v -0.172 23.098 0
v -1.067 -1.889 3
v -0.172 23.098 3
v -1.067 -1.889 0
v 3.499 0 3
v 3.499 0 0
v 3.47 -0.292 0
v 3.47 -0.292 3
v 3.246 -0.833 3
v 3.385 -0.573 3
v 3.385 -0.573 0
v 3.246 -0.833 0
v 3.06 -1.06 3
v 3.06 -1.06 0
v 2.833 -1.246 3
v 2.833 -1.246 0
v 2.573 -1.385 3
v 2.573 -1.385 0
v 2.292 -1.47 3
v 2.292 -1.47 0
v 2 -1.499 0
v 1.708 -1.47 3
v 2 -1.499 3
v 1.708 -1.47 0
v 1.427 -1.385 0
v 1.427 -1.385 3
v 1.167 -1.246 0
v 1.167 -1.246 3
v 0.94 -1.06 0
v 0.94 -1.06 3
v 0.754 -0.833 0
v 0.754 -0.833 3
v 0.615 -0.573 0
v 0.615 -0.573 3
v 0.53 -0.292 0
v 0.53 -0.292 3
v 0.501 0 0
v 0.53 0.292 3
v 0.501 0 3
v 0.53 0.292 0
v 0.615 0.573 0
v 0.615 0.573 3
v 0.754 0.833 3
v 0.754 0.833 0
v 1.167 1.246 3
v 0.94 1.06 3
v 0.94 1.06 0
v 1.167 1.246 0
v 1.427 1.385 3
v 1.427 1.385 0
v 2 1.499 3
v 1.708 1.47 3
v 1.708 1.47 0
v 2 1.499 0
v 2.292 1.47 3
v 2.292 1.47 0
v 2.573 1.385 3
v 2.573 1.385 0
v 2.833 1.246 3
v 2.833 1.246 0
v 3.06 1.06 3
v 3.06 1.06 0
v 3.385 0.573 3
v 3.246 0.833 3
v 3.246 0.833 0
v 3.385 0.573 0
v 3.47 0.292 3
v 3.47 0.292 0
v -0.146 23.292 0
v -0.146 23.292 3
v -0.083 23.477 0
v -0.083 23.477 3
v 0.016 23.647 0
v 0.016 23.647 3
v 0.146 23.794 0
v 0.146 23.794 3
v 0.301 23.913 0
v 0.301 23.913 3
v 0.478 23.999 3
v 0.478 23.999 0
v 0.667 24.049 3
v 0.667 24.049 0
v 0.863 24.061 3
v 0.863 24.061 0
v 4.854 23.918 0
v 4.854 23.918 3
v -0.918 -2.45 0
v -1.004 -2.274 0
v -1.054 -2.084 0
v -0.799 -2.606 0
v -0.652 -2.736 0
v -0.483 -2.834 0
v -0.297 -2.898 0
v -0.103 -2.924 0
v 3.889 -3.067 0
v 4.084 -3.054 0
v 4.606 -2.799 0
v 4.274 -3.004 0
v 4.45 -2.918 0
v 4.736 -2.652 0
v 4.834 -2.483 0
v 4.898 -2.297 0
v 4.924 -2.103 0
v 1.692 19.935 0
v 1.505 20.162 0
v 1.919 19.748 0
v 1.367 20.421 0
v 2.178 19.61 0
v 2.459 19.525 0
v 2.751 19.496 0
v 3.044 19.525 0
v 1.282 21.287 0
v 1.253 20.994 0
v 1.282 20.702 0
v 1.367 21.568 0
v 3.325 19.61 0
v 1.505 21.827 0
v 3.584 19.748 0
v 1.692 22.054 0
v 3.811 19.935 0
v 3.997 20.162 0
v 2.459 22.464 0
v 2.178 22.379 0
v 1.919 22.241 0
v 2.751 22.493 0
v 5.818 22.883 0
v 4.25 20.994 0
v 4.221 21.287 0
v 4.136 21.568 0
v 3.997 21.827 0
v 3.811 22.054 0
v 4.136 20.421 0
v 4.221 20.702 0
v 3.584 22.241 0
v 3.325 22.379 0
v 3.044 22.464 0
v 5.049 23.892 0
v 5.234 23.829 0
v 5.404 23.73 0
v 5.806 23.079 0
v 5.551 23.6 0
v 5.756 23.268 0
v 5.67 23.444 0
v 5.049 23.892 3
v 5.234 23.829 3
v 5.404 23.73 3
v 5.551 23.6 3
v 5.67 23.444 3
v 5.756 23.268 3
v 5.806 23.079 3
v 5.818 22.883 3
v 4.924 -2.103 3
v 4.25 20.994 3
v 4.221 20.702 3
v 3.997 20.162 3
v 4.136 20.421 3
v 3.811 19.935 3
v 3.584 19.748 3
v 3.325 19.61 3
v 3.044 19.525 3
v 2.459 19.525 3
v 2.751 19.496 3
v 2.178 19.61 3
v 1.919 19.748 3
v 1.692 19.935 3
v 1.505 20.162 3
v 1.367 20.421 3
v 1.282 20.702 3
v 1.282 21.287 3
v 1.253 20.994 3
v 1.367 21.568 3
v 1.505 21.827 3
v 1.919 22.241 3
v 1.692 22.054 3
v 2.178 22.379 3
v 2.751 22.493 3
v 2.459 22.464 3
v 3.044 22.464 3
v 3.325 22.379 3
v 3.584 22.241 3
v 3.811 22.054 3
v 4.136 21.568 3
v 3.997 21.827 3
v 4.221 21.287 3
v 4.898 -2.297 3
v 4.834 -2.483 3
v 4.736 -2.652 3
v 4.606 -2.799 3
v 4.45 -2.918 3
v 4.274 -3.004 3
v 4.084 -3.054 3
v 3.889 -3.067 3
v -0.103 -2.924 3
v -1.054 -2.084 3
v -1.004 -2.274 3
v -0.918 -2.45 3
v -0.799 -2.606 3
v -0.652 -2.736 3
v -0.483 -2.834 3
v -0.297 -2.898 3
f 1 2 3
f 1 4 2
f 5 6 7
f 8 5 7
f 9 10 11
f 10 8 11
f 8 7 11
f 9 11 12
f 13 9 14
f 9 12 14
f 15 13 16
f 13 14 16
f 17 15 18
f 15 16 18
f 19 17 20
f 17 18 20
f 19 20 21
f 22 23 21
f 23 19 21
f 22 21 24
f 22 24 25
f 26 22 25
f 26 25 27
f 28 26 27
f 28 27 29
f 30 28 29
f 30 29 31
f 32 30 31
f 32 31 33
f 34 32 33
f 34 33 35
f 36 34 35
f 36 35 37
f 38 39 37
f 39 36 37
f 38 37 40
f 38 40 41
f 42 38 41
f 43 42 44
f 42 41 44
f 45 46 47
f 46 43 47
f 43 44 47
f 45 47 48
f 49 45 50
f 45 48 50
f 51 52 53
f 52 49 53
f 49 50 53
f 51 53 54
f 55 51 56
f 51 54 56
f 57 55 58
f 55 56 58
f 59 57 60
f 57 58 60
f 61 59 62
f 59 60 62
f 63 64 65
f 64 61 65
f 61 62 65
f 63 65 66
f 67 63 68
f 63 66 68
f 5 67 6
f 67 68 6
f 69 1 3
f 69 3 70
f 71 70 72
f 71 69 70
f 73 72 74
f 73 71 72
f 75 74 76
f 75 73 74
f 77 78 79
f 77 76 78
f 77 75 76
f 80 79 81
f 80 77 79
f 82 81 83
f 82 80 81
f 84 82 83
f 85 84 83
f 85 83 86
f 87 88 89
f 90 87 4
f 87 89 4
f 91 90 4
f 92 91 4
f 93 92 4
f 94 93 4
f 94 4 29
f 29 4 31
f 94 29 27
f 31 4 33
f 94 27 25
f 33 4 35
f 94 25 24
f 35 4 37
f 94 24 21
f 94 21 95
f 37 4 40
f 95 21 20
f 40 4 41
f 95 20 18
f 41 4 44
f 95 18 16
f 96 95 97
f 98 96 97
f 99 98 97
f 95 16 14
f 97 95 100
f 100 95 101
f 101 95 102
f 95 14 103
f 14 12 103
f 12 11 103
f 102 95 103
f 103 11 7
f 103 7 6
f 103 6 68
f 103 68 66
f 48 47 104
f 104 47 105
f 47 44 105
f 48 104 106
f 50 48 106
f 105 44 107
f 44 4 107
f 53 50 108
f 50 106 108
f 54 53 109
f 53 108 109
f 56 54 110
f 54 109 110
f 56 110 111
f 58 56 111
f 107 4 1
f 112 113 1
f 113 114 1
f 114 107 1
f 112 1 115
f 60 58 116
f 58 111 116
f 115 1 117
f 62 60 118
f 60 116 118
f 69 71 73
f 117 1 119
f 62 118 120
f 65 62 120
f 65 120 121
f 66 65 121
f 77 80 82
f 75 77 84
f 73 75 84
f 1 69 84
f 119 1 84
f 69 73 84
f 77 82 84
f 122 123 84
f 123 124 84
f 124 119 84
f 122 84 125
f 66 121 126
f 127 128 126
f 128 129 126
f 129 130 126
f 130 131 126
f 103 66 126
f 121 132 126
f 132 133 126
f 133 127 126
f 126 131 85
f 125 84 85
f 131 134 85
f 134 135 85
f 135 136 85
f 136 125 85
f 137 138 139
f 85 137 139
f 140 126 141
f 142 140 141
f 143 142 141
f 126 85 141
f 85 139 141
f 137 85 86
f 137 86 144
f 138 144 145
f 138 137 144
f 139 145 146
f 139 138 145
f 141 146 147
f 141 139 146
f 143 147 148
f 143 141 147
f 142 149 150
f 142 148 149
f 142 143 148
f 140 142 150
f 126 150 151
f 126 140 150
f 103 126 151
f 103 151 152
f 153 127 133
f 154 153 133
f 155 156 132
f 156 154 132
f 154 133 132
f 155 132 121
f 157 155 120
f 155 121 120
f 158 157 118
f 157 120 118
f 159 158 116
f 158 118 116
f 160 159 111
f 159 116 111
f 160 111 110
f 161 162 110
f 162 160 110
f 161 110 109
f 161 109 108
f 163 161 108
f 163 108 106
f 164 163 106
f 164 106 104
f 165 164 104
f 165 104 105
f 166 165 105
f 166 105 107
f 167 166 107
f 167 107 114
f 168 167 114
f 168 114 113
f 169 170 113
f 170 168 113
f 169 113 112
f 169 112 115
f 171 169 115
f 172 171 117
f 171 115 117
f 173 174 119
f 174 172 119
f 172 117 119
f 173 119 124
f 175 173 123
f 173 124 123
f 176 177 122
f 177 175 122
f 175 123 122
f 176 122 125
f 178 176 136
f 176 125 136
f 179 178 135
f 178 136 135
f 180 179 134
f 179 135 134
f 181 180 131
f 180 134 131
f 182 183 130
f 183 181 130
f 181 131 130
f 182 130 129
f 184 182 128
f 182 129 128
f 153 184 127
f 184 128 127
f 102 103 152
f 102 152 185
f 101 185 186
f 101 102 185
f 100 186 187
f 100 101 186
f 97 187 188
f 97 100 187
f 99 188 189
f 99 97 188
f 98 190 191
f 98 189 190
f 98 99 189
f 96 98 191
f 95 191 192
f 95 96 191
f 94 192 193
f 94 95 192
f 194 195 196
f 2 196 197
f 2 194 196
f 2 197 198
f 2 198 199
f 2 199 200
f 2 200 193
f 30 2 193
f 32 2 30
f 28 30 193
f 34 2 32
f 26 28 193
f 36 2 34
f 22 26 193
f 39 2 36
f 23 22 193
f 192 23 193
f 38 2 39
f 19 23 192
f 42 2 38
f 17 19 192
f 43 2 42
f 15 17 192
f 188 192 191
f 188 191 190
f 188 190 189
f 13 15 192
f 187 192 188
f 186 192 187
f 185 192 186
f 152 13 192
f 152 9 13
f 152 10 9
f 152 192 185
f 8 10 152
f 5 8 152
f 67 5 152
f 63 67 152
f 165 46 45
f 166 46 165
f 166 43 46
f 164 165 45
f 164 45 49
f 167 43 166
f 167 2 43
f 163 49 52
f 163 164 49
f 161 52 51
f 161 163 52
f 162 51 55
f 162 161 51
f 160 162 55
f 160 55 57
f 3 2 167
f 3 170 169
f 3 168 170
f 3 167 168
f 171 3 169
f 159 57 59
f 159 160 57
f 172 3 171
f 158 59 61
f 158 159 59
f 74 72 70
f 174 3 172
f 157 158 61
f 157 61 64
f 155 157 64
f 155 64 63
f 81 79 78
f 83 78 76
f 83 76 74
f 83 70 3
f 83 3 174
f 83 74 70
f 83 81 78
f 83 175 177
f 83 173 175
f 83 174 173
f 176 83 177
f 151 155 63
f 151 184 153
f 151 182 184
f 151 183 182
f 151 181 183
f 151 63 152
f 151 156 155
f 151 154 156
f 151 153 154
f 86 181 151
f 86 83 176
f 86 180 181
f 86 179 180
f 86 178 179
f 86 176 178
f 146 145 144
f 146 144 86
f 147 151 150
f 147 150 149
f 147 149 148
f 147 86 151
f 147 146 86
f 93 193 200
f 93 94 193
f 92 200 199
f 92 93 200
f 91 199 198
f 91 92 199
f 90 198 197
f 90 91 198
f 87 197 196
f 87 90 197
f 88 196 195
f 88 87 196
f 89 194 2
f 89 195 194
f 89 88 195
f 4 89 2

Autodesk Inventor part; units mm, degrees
ref_plane "YZ Plane" through (0, 0, 0) normal (1, 0, 0) x (0, 1, 0)
ref_plane "XZ Plane" through (0, 0, 0) normal (0, 1, 0) x (-1, 0, 0)
ref_plane "XY Plane" through (0, 0, 0) normal (0, 0, 1) x (1, 0, 0)
sketch "Sketch1" plane through (0, 0, 0) normal (0, 0, 1) x (1, 0, 0)
  line L0 (-1.0667, -1.8887) -> (-0.1724, 23.0976)
  line L1 (0.8627, 24.0612) -> (4.8545, 23.9183)
  line L2 (5.8181, 22.8832) -> (4.9238, -2.1031)
  line L3 (3.8887, -3.0667) -> (-0.1031, -2.9238)
  circle A0 centre (2, 0) radius 1.4986
  circle A1 centre (2.7514, 20.9945) radius 1.4986
  circle A2 centre (2.7514, 20.9945) radius 1.4986 projected
  circle A3 centre (2, 0) radius 1.4986 projected
  arc A4 (-1.0667, -1.8887) -> (-0.1031, -2.9238) centre (-0.0674, -1.9245) ccw
  arc A5 (3.8887, -3.0667) -> (4.9238, -2.1031) centre (3.9245, -2.0674) ccw
  arc A6 (5.8181, 22.8832) -> (4.8545, 23.9183) centre (4.8188, 22.919) ccw
  arc A7 (0.8627, 24.0612) -> (-0.1724, 23.0976) centre (0.8269, 23.0619) ccw
  point P0 (0, 0)
  dimension "d0" = 5.9944
  dimension "d1" = 2.9972
  dimension "d2" = 2.9972
  dimension "d3" = 2.9972
  dimension "d4" = 2.9972
  dimension "d6" = 2.9972
  dimension "d7" = 2.9972
  dimension "d8" = 1
extrude "Extrusion1" add sketch "Sketch1" along normal blind 3
equation "\"d2\" = d1"
equation "\"d3\" = d2"
equation "\"d4\" = d2"
equation "\"d6\" = d1"
properties part number "Connector Boi"
